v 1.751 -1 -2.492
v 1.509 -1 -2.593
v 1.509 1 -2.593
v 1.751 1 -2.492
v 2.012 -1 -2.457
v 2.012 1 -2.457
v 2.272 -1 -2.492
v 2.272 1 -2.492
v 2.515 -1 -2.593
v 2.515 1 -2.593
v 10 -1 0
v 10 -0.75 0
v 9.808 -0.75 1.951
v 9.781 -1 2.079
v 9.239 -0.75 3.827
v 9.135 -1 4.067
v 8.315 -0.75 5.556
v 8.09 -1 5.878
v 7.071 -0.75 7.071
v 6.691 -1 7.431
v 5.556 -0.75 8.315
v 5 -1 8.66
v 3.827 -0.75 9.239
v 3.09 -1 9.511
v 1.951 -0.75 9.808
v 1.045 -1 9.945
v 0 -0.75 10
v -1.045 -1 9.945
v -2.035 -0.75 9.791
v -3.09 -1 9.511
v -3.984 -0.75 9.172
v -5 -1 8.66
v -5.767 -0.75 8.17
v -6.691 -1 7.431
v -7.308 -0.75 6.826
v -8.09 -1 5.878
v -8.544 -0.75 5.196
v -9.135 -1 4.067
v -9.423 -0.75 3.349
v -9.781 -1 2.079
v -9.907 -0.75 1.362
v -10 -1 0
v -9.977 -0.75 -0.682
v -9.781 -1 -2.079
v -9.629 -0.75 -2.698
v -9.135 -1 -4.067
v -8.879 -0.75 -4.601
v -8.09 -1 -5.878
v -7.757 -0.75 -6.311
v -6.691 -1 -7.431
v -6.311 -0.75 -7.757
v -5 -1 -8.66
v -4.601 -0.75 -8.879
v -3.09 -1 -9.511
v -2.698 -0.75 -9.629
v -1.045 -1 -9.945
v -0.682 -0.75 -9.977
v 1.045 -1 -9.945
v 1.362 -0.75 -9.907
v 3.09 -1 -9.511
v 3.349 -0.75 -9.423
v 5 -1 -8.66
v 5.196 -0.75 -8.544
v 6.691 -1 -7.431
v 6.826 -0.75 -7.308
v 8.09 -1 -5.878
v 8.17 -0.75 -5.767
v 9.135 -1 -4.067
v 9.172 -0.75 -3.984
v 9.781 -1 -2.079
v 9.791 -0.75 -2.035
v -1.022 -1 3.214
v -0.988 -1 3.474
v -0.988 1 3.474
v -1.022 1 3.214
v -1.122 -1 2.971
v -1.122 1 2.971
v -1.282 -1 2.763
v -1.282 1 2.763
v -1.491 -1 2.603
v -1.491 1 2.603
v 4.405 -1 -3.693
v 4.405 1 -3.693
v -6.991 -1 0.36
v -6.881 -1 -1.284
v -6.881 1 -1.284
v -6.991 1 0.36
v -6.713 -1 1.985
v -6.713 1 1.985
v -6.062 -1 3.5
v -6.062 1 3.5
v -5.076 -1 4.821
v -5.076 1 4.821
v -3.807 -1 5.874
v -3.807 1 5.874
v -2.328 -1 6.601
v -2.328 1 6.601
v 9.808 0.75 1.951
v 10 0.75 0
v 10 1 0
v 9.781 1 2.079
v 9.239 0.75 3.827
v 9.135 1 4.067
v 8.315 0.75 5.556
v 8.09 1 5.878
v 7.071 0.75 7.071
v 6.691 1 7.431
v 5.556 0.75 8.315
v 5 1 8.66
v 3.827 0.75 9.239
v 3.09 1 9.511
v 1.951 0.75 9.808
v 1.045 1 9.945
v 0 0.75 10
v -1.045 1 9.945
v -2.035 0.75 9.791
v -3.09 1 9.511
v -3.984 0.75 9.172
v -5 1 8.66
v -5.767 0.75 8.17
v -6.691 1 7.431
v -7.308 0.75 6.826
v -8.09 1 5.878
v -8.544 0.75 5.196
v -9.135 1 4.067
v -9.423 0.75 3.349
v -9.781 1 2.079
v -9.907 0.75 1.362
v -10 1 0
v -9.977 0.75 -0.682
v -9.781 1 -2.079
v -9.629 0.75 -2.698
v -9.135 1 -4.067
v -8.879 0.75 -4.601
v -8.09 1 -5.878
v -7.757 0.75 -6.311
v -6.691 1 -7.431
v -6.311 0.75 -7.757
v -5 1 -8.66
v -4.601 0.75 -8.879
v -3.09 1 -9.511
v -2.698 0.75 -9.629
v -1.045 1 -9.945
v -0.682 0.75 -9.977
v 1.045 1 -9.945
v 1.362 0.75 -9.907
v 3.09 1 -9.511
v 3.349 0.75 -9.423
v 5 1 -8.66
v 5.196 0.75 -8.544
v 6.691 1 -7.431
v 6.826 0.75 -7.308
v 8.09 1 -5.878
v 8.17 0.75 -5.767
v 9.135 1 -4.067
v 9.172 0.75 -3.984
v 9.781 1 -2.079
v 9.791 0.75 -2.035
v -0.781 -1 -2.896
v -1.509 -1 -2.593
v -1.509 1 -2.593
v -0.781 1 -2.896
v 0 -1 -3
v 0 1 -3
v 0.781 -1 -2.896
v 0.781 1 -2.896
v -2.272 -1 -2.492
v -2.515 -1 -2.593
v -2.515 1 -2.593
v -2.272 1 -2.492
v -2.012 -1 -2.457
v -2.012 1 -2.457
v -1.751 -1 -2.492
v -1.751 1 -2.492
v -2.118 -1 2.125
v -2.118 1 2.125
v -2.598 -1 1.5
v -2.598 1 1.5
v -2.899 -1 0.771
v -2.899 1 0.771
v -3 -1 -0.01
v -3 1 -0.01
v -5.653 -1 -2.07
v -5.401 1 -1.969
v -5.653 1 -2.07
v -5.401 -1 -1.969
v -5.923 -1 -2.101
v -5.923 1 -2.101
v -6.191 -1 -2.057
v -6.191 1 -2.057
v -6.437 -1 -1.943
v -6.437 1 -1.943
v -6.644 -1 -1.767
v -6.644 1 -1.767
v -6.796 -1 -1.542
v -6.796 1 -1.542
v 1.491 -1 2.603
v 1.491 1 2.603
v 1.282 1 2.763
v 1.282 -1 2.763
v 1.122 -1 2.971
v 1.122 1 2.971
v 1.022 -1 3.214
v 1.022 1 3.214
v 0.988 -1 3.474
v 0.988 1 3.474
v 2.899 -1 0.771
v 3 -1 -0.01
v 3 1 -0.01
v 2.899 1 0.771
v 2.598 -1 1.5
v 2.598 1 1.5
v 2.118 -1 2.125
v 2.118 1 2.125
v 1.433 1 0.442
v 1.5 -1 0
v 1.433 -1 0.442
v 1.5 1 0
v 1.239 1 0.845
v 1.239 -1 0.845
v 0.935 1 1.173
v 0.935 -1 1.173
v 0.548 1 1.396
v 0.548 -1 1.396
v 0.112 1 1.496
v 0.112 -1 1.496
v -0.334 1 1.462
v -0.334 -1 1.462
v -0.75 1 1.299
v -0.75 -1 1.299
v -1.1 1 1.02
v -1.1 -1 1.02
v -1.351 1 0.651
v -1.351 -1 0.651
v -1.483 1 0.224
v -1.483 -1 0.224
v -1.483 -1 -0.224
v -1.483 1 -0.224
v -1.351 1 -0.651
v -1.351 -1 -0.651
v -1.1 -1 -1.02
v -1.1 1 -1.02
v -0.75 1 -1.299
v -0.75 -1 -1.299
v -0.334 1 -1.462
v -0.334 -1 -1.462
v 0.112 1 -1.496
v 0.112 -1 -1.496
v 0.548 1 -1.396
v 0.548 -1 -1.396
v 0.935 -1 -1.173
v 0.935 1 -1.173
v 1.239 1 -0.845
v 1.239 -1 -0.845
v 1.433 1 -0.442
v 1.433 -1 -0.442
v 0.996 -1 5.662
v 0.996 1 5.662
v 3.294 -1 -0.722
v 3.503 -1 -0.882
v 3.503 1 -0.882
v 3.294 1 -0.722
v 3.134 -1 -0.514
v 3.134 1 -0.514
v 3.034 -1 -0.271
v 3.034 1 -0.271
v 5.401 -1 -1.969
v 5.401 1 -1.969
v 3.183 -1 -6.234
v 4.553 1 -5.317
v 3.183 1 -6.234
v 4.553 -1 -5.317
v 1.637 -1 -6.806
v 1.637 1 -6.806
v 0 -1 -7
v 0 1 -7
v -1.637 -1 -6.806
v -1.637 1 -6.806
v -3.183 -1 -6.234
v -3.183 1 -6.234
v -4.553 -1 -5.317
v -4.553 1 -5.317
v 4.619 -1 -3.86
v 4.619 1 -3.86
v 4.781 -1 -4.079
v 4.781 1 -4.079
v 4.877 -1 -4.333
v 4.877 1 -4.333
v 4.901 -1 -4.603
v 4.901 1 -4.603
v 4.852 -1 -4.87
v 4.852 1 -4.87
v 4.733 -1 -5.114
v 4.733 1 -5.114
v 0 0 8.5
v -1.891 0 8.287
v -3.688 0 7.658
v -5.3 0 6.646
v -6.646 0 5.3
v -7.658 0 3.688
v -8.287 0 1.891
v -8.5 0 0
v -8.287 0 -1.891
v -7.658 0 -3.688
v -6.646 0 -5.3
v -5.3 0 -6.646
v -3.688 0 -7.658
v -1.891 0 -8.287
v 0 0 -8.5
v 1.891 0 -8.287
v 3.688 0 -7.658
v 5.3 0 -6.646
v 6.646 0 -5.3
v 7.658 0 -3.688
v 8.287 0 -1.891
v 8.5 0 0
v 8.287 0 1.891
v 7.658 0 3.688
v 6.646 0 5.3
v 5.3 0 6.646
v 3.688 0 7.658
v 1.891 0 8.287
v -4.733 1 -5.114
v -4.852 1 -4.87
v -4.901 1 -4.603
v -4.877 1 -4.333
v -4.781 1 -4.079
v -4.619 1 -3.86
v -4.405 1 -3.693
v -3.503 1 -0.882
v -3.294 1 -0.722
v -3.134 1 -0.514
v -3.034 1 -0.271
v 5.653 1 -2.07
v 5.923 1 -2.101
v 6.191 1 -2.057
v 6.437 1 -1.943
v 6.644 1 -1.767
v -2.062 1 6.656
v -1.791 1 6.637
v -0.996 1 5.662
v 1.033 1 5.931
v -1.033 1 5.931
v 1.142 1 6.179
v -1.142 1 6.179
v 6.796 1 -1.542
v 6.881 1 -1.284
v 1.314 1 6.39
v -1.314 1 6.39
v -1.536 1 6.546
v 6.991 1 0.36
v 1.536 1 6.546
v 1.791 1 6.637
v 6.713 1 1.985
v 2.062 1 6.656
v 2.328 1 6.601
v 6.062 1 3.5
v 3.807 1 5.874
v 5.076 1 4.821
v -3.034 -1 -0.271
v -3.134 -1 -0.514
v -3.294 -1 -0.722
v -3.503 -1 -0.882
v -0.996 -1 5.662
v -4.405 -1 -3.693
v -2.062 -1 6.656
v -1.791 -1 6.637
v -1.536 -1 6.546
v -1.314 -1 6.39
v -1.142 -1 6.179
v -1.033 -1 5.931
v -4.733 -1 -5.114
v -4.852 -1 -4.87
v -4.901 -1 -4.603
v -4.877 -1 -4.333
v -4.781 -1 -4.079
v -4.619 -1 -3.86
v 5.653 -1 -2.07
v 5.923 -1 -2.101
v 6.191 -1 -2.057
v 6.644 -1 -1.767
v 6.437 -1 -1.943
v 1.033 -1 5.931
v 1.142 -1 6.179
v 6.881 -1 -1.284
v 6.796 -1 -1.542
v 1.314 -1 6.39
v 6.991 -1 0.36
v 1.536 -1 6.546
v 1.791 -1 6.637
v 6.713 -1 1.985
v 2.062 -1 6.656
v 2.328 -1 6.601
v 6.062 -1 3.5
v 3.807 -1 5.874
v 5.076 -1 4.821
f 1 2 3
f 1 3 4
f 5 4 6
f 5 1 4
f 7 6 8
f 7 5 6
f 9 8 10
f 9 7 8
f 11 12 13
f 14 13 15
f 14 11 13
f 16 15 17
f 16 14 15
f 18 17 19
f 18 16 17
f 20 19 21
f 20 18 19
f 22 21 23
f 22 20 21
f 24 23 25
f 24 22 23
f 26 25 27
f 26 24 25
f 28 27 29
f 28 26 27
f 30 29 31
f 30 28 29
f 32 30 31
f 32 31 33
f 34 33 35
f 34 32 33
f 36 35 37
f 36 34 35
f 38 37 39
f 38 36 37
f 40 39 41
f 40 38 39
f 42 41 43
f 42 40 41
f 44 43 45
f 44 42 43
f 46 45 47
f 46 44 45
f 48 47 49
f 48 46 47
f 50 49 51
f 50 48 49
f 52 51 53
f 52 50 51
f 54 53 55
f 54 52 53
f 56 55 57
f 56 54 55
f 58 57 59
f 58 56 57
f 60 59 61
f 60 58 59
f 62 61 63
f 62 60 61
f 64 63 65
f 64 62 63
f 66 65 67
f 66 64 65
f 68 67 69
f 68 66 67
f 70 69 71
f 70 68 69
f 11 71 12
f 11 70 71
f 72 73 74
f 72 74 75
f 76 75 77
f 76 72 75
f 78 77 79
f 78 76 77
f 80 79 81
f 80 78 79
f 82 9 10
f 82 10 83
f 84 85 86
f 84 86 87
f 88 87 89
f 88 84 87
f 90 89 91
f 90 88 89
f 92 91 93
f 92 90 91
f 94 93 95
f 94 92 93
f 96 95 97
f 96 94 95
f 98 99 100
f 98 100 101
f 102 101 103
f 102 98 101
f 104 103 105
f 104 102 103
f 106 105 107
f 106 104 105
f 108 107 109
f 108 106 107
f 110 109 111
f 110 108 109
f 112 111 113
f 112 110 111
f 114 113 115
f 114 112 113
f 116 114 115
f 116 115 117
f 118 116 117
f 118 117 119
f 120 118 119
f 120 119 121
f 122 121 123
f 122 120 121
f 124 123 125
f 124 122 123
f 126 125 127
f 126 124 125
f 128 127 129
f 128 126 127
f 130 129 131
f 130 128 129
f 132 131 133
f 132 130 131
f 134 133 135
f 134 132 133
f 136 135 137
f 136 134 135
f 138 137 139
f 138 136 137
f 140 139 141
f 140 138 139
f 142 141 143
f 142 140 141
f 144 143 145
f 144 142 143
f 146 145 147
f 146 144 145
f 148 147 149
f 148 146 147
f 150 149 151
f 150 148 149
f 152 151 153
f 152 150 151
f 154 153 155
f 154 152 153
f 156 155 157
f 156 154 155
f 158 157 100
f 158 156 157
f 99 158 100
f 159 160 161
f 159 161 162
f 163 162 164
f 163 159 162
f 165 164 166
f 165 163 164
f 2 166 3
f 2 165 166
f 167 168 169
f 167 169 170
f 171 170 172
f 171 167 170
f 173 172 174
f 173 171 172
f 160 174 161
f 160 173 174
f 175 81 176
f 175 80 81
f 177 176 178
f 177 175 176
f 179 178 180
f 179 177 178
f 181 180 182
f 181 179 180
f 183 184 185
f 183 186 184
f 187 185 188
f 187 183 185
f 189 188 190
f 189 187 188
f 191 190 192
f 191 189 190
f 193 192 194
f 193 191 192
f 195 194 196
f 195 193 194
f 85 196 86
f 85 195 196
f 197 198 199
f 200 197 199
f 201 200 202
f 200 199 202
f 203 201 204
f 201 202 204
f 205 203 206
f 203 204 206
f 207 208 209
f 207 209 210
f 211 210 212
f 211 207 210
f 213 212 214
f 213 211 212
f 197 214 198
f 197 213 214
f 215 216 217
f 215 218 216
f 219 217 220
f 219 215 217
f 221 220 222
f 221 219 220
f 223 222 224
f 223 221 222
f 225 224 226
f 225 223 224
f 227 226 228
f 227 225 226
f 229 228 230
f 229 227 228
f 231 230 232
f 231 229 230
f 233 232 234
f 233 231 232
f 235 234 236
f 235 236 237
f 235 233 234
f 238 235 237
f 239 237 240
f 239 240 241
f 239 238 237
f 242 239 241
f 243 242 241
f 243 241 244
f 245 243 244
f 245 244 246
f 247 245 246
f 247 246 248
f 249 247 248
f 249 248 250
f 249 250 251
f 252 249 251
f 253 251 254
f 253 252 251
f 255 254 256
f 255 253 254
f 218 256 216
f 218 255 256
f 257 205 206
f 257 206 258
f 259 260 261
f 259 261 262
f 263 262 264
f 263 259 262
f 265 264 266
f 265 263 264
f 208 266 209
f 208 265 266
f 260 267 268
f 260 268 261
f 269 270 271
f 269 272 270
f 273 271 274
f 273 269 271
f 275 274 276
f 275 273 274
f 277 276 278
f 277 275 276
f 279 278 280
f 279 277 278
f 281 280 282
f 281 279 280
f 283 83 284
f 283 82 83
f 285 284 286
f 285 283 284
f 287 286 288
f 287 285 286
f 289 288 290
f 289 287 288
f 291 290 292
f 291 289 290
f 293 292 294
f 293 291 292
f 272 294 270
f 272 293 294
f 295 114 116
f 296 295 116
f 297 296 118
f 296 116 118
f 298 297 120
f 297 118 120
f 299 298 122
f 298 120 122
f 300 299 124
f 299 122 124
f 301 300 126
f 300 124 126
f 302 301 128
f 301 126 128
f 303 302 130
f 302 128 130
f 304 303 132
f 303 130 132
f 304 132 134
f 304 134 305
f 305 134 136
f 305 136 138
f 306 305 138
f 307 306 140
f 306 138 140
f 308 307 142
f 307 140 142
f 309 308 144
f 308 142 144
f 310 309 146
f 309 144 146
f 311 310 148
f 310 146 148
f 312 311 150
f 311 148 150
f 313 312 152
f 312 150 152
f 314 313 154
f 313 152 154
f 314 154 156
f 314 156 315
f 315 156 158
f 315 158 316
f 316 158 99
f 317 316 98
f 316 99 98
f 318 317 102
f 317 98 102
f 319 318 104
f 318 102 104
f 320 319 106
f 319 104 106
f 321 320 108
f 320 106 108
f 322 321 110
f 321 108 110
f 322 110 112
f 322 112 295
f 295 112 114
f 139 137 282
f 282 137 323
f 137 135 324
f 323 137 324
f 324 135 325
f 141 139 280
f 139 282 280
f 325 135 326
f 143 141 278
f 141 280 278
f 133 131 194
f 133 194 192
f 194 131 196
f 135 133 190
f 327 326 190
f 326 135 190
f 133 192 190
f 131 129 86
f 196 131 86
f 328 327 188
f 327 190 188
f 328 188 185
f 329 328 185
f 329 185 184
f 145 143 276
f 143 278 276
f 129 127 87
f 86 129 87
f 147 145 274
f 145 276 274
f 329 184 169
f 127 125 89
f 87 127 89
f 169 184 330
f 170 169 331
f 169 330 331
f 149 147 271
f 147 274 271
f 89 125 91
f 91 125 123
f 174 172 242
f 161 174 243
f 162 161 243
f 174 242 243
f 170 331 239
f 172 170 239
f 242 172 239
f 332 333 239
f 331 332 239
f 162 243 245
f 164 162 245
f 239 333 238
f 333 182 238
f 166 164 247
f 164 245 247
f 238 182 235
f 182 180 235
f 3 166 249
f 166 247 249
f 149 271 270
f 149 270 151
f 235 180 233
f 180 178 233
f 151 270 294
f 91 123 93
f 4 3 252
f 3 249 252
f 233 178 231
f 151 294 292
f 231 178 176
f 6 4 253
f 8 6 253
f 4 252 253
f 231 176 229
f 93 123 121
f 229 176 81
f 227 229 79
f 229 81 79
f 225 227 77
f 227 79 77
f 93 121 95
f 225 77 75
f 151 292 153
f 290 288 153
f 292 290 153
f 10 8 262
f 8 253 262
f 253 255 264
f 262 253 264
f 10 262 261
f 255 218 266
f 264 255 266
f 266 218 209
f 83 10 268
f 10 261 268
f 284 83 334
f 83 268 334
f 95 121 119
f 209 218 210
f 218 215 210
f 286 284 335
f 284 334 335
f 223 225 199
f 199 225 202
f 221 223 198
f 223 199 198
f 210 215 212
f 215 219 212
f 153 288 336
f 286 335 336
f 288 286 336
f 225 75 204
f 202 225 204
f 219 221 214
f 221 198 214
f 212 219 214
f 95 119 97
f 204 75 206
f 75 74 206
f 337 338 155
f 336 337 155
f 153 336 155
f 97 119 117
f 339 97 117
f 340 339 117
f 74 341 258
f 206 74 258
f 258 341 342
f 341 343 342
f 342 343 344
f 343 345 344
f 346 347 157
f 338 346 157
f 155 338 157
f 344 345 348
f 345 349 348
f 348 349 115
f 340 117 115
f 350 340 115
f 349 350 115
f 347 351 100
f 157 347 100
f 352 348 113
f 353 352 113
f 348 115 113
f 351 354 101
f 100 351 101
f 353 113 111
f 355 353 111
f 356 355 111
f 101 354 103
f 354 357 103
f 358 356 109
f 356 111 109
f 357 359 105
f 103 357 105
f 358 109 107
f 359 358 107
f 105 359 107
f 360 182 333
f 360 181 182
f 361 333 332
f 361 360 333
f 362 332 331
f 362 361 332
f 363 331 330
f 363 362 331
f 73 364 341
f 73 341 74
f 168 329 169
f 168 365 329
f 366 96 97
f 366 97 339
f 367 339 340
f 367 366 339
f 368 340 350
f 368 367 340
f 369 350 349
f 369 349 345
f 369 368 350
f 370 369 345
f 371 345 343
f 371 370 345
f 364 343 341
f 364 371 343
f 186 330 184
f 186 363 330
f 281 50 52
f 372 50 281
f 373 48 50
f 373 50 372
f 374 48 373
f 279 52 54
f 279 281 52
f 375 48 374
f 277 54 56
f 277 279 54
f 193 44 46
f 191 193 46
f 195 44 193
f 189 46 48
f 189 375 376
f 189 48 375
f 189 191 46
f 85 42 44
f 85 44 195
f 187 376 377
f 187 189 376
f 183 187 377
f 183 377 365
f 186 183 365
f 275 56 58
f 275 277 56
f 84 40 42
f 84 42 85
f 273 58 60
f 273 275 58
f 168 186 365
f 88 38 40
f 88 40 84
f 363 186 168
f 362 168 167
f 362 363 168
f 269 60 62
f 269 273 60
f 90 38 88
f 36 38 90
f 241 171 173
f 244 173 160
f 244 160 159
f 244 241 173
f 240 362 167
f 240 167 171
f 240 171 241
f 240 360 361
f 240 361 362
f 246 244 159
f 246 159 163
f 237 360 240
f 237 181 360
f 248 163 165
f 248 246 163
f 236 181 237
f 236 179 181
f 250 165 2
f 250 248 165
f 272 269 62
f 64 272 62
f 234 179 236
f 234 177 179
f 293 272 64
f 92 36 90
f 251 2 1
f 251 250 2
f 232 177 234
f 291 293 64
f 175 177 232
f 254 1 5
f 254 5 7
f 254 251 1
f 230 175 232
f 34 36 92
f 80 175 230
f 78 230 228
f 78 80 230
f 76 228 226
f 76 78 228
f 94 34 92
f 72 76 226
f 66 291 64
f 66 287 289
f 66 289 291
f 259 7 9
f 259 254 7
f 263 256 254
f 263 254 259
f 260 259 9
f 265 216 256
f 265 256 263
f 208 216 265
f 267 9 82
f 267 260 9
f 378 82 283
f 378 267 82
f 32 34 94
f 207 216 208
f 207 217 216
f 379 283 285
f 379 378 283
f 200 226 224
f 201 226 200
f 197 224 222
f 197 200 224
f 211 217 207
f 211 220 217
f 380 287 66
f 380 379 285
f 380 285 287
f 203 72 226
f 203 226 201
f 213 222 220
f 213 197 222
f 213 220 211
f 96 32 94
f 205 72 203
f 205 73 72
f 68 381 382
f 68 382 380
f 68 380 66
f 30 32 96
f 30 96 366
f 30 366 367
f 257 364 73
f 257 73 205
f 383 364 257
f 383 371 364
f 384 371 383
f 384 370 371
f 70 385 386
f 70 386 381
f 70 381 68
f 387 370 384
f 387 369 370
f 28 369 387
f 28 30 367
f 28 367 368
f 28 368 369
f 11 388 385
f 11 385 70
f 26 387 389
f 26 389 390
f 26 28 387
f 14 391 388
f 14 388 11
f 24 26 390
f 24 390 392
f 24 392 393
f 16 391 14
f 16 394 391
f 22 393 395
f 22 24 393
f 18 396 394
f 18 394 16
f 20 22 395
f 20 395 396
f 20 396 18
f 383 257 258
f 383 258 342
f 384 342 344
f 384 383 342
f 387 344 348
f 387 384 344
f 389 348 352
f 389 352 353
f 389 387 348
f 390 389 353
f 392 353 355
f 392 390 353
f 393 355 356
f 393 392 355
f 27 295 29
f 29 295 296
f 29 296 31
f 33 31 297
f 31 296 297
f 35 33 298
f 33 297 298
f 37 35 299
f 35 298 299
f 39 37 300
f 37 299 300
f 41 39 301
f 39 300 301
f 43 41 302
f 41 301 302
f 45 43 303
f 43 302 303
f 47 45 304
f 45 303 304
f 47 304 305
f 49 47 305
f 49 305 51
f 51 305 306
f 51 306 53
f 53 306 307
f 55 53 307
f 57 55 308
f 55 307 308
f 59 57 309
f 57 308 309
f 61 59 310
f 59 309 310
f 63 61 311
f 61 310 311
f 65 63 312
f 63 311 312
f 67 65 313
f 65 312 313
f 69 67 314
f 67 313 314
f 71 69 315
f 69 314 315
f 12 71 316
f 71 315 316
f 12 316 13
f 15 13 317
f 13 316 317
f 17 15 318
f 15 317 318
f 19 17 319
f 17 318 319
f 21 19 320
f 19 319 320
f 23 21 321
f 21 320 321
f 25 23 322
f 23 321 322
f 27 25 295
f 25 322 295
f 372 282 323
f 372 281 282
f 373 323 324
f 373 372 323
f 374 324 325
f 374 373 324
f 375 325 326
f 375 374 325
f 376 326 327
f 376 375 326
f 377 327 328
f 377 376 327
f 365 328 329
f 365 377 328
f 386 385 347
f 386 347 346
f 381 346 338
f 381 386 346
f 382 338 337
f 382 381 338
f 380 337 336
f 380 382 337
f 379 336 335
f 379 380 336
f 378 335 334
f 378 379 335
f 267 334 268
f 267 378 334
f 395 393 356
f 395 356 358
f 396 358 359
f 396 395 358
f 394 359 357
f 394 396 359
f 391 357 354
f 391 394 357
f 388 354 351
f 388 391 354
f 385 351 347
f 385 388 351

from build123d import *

# Parameters (mm, degrees)
F0_R     = 10
F0_R_2   = 1.5
F1_DEPTH = 1


with BuildPart() as f1:
    # F0 (on Front) → F1 (new body, symmetric)
    with BuildSketch(Plane.XZ):
        Circle(F0_R)
        with BuildLine():
            ThreePointArc((-2.514889, -2.592907), (-2.011909, -2.457202), (-1.508927, -2.592901))
            ThreePointArc((-1.508927, -2.592901), (0, -3), (1.508927, -2.592901))
            ThreePointArc((1.508927, -2.592901), (2.011909, -2.457202), (2.514889, -2.592907))
            Line((2.514889, -2.592907), (4.405493, -3.693166))
            ThreePointArc((4.405493, -3.693166), (4.89841, -4.467042), (4.552924, -5.317037))
            ThreePointArc((4.552924, -5.317037), (0, -7), (-4.552924, -5.317037))
            ThreePointArc((-4.552924, -5.317037), (-4.89841, -4.467042), (-4.405493, -3.693166))
            Line((-4.405493, -3.693166), (-2.514889, -2.592907))
        make_face(mode=Mode.SUBTRACT)
        with BuildLine():
            ThreePointArc((-6.881151, -1.28443), (-6.062178, 3.5), (-2.328227, 6.601466))
            ThreePointArc((-2.328227, 6.601466), (-1.419367, 6.475669), (-0.995629, 5.661851))
            Line((-0.995629, 5.661851), (-0.988079, 3.474412))
            ThreePointArc((-0.988079, 3.474412), (-1.122045, 2.970966), (-1.491055, 2.60322))
            ThreePointArc((-1.491055, 2.60322), (-2.598076, 1.5), (-2.999982, -0.010319))
            ThreePointArc((-2.999982, -0.010319), (-3.133954, -0.513764), (-3.502968, -0.881504))
            Line((-3.502968, -0.881504), (-5.401122, -1.968686))
            ThreePointArc((-5.401122, -1.968686), (-6.317777, -2.008627), (-6.881151, -1.28443))
        make_face(mode=Mode.SUBTRACT)
        Circle(F0_R_2, mode=Mode.SUBTRACT)
        with BuildLine():
            ThreePointArc((1.491055, 2.60322), (1.122045, 2.970966), (0.988079, 3.474412))
            Line((0.988079, 3.474412), (0.995629, 5.661851))
            ThreePointArc((0.995629, 5.661851), (1.419367, 6.475669), (2.328227, 6.601466))
            ThreePointArc((2.328227, 6.601466), (6.062178, 3.5), (6.881151, -1.28443))
            ThreePointArc((6.881151, -1.28443), (6.317777, -2.008627), (5.401122, -1.968686))
            Line((5.401122, -1.968686), (3.502968, -0.881504))
            ThreePointArc((3.502968, -0.881504), (3.133954, -0.513764), (2.999982, -0.010319))
            ThreePointArc((2.999982, -0.010319), (2.598076, 1.5), (1.491055, 2.60322))
        make_face(mode=Mode.SUBTRACT)
    extrude(amount=F1_DEPTH, both=True)

    # F2 (on Right) → F3 (revolve, cut)
    with BuildSketch(Plane.YZ):
        Polygon((0.75, 10), (0, 10), (0, 8.5), align=None)
        Polygon((0, 8.5), (0, 10), (-0.75, 10), align=None)
    revolve(axis=Axis((0, -0.179222, 0), (0, -1, 0)), mode=Mode.SUBTRACT)


solid = f1.part
